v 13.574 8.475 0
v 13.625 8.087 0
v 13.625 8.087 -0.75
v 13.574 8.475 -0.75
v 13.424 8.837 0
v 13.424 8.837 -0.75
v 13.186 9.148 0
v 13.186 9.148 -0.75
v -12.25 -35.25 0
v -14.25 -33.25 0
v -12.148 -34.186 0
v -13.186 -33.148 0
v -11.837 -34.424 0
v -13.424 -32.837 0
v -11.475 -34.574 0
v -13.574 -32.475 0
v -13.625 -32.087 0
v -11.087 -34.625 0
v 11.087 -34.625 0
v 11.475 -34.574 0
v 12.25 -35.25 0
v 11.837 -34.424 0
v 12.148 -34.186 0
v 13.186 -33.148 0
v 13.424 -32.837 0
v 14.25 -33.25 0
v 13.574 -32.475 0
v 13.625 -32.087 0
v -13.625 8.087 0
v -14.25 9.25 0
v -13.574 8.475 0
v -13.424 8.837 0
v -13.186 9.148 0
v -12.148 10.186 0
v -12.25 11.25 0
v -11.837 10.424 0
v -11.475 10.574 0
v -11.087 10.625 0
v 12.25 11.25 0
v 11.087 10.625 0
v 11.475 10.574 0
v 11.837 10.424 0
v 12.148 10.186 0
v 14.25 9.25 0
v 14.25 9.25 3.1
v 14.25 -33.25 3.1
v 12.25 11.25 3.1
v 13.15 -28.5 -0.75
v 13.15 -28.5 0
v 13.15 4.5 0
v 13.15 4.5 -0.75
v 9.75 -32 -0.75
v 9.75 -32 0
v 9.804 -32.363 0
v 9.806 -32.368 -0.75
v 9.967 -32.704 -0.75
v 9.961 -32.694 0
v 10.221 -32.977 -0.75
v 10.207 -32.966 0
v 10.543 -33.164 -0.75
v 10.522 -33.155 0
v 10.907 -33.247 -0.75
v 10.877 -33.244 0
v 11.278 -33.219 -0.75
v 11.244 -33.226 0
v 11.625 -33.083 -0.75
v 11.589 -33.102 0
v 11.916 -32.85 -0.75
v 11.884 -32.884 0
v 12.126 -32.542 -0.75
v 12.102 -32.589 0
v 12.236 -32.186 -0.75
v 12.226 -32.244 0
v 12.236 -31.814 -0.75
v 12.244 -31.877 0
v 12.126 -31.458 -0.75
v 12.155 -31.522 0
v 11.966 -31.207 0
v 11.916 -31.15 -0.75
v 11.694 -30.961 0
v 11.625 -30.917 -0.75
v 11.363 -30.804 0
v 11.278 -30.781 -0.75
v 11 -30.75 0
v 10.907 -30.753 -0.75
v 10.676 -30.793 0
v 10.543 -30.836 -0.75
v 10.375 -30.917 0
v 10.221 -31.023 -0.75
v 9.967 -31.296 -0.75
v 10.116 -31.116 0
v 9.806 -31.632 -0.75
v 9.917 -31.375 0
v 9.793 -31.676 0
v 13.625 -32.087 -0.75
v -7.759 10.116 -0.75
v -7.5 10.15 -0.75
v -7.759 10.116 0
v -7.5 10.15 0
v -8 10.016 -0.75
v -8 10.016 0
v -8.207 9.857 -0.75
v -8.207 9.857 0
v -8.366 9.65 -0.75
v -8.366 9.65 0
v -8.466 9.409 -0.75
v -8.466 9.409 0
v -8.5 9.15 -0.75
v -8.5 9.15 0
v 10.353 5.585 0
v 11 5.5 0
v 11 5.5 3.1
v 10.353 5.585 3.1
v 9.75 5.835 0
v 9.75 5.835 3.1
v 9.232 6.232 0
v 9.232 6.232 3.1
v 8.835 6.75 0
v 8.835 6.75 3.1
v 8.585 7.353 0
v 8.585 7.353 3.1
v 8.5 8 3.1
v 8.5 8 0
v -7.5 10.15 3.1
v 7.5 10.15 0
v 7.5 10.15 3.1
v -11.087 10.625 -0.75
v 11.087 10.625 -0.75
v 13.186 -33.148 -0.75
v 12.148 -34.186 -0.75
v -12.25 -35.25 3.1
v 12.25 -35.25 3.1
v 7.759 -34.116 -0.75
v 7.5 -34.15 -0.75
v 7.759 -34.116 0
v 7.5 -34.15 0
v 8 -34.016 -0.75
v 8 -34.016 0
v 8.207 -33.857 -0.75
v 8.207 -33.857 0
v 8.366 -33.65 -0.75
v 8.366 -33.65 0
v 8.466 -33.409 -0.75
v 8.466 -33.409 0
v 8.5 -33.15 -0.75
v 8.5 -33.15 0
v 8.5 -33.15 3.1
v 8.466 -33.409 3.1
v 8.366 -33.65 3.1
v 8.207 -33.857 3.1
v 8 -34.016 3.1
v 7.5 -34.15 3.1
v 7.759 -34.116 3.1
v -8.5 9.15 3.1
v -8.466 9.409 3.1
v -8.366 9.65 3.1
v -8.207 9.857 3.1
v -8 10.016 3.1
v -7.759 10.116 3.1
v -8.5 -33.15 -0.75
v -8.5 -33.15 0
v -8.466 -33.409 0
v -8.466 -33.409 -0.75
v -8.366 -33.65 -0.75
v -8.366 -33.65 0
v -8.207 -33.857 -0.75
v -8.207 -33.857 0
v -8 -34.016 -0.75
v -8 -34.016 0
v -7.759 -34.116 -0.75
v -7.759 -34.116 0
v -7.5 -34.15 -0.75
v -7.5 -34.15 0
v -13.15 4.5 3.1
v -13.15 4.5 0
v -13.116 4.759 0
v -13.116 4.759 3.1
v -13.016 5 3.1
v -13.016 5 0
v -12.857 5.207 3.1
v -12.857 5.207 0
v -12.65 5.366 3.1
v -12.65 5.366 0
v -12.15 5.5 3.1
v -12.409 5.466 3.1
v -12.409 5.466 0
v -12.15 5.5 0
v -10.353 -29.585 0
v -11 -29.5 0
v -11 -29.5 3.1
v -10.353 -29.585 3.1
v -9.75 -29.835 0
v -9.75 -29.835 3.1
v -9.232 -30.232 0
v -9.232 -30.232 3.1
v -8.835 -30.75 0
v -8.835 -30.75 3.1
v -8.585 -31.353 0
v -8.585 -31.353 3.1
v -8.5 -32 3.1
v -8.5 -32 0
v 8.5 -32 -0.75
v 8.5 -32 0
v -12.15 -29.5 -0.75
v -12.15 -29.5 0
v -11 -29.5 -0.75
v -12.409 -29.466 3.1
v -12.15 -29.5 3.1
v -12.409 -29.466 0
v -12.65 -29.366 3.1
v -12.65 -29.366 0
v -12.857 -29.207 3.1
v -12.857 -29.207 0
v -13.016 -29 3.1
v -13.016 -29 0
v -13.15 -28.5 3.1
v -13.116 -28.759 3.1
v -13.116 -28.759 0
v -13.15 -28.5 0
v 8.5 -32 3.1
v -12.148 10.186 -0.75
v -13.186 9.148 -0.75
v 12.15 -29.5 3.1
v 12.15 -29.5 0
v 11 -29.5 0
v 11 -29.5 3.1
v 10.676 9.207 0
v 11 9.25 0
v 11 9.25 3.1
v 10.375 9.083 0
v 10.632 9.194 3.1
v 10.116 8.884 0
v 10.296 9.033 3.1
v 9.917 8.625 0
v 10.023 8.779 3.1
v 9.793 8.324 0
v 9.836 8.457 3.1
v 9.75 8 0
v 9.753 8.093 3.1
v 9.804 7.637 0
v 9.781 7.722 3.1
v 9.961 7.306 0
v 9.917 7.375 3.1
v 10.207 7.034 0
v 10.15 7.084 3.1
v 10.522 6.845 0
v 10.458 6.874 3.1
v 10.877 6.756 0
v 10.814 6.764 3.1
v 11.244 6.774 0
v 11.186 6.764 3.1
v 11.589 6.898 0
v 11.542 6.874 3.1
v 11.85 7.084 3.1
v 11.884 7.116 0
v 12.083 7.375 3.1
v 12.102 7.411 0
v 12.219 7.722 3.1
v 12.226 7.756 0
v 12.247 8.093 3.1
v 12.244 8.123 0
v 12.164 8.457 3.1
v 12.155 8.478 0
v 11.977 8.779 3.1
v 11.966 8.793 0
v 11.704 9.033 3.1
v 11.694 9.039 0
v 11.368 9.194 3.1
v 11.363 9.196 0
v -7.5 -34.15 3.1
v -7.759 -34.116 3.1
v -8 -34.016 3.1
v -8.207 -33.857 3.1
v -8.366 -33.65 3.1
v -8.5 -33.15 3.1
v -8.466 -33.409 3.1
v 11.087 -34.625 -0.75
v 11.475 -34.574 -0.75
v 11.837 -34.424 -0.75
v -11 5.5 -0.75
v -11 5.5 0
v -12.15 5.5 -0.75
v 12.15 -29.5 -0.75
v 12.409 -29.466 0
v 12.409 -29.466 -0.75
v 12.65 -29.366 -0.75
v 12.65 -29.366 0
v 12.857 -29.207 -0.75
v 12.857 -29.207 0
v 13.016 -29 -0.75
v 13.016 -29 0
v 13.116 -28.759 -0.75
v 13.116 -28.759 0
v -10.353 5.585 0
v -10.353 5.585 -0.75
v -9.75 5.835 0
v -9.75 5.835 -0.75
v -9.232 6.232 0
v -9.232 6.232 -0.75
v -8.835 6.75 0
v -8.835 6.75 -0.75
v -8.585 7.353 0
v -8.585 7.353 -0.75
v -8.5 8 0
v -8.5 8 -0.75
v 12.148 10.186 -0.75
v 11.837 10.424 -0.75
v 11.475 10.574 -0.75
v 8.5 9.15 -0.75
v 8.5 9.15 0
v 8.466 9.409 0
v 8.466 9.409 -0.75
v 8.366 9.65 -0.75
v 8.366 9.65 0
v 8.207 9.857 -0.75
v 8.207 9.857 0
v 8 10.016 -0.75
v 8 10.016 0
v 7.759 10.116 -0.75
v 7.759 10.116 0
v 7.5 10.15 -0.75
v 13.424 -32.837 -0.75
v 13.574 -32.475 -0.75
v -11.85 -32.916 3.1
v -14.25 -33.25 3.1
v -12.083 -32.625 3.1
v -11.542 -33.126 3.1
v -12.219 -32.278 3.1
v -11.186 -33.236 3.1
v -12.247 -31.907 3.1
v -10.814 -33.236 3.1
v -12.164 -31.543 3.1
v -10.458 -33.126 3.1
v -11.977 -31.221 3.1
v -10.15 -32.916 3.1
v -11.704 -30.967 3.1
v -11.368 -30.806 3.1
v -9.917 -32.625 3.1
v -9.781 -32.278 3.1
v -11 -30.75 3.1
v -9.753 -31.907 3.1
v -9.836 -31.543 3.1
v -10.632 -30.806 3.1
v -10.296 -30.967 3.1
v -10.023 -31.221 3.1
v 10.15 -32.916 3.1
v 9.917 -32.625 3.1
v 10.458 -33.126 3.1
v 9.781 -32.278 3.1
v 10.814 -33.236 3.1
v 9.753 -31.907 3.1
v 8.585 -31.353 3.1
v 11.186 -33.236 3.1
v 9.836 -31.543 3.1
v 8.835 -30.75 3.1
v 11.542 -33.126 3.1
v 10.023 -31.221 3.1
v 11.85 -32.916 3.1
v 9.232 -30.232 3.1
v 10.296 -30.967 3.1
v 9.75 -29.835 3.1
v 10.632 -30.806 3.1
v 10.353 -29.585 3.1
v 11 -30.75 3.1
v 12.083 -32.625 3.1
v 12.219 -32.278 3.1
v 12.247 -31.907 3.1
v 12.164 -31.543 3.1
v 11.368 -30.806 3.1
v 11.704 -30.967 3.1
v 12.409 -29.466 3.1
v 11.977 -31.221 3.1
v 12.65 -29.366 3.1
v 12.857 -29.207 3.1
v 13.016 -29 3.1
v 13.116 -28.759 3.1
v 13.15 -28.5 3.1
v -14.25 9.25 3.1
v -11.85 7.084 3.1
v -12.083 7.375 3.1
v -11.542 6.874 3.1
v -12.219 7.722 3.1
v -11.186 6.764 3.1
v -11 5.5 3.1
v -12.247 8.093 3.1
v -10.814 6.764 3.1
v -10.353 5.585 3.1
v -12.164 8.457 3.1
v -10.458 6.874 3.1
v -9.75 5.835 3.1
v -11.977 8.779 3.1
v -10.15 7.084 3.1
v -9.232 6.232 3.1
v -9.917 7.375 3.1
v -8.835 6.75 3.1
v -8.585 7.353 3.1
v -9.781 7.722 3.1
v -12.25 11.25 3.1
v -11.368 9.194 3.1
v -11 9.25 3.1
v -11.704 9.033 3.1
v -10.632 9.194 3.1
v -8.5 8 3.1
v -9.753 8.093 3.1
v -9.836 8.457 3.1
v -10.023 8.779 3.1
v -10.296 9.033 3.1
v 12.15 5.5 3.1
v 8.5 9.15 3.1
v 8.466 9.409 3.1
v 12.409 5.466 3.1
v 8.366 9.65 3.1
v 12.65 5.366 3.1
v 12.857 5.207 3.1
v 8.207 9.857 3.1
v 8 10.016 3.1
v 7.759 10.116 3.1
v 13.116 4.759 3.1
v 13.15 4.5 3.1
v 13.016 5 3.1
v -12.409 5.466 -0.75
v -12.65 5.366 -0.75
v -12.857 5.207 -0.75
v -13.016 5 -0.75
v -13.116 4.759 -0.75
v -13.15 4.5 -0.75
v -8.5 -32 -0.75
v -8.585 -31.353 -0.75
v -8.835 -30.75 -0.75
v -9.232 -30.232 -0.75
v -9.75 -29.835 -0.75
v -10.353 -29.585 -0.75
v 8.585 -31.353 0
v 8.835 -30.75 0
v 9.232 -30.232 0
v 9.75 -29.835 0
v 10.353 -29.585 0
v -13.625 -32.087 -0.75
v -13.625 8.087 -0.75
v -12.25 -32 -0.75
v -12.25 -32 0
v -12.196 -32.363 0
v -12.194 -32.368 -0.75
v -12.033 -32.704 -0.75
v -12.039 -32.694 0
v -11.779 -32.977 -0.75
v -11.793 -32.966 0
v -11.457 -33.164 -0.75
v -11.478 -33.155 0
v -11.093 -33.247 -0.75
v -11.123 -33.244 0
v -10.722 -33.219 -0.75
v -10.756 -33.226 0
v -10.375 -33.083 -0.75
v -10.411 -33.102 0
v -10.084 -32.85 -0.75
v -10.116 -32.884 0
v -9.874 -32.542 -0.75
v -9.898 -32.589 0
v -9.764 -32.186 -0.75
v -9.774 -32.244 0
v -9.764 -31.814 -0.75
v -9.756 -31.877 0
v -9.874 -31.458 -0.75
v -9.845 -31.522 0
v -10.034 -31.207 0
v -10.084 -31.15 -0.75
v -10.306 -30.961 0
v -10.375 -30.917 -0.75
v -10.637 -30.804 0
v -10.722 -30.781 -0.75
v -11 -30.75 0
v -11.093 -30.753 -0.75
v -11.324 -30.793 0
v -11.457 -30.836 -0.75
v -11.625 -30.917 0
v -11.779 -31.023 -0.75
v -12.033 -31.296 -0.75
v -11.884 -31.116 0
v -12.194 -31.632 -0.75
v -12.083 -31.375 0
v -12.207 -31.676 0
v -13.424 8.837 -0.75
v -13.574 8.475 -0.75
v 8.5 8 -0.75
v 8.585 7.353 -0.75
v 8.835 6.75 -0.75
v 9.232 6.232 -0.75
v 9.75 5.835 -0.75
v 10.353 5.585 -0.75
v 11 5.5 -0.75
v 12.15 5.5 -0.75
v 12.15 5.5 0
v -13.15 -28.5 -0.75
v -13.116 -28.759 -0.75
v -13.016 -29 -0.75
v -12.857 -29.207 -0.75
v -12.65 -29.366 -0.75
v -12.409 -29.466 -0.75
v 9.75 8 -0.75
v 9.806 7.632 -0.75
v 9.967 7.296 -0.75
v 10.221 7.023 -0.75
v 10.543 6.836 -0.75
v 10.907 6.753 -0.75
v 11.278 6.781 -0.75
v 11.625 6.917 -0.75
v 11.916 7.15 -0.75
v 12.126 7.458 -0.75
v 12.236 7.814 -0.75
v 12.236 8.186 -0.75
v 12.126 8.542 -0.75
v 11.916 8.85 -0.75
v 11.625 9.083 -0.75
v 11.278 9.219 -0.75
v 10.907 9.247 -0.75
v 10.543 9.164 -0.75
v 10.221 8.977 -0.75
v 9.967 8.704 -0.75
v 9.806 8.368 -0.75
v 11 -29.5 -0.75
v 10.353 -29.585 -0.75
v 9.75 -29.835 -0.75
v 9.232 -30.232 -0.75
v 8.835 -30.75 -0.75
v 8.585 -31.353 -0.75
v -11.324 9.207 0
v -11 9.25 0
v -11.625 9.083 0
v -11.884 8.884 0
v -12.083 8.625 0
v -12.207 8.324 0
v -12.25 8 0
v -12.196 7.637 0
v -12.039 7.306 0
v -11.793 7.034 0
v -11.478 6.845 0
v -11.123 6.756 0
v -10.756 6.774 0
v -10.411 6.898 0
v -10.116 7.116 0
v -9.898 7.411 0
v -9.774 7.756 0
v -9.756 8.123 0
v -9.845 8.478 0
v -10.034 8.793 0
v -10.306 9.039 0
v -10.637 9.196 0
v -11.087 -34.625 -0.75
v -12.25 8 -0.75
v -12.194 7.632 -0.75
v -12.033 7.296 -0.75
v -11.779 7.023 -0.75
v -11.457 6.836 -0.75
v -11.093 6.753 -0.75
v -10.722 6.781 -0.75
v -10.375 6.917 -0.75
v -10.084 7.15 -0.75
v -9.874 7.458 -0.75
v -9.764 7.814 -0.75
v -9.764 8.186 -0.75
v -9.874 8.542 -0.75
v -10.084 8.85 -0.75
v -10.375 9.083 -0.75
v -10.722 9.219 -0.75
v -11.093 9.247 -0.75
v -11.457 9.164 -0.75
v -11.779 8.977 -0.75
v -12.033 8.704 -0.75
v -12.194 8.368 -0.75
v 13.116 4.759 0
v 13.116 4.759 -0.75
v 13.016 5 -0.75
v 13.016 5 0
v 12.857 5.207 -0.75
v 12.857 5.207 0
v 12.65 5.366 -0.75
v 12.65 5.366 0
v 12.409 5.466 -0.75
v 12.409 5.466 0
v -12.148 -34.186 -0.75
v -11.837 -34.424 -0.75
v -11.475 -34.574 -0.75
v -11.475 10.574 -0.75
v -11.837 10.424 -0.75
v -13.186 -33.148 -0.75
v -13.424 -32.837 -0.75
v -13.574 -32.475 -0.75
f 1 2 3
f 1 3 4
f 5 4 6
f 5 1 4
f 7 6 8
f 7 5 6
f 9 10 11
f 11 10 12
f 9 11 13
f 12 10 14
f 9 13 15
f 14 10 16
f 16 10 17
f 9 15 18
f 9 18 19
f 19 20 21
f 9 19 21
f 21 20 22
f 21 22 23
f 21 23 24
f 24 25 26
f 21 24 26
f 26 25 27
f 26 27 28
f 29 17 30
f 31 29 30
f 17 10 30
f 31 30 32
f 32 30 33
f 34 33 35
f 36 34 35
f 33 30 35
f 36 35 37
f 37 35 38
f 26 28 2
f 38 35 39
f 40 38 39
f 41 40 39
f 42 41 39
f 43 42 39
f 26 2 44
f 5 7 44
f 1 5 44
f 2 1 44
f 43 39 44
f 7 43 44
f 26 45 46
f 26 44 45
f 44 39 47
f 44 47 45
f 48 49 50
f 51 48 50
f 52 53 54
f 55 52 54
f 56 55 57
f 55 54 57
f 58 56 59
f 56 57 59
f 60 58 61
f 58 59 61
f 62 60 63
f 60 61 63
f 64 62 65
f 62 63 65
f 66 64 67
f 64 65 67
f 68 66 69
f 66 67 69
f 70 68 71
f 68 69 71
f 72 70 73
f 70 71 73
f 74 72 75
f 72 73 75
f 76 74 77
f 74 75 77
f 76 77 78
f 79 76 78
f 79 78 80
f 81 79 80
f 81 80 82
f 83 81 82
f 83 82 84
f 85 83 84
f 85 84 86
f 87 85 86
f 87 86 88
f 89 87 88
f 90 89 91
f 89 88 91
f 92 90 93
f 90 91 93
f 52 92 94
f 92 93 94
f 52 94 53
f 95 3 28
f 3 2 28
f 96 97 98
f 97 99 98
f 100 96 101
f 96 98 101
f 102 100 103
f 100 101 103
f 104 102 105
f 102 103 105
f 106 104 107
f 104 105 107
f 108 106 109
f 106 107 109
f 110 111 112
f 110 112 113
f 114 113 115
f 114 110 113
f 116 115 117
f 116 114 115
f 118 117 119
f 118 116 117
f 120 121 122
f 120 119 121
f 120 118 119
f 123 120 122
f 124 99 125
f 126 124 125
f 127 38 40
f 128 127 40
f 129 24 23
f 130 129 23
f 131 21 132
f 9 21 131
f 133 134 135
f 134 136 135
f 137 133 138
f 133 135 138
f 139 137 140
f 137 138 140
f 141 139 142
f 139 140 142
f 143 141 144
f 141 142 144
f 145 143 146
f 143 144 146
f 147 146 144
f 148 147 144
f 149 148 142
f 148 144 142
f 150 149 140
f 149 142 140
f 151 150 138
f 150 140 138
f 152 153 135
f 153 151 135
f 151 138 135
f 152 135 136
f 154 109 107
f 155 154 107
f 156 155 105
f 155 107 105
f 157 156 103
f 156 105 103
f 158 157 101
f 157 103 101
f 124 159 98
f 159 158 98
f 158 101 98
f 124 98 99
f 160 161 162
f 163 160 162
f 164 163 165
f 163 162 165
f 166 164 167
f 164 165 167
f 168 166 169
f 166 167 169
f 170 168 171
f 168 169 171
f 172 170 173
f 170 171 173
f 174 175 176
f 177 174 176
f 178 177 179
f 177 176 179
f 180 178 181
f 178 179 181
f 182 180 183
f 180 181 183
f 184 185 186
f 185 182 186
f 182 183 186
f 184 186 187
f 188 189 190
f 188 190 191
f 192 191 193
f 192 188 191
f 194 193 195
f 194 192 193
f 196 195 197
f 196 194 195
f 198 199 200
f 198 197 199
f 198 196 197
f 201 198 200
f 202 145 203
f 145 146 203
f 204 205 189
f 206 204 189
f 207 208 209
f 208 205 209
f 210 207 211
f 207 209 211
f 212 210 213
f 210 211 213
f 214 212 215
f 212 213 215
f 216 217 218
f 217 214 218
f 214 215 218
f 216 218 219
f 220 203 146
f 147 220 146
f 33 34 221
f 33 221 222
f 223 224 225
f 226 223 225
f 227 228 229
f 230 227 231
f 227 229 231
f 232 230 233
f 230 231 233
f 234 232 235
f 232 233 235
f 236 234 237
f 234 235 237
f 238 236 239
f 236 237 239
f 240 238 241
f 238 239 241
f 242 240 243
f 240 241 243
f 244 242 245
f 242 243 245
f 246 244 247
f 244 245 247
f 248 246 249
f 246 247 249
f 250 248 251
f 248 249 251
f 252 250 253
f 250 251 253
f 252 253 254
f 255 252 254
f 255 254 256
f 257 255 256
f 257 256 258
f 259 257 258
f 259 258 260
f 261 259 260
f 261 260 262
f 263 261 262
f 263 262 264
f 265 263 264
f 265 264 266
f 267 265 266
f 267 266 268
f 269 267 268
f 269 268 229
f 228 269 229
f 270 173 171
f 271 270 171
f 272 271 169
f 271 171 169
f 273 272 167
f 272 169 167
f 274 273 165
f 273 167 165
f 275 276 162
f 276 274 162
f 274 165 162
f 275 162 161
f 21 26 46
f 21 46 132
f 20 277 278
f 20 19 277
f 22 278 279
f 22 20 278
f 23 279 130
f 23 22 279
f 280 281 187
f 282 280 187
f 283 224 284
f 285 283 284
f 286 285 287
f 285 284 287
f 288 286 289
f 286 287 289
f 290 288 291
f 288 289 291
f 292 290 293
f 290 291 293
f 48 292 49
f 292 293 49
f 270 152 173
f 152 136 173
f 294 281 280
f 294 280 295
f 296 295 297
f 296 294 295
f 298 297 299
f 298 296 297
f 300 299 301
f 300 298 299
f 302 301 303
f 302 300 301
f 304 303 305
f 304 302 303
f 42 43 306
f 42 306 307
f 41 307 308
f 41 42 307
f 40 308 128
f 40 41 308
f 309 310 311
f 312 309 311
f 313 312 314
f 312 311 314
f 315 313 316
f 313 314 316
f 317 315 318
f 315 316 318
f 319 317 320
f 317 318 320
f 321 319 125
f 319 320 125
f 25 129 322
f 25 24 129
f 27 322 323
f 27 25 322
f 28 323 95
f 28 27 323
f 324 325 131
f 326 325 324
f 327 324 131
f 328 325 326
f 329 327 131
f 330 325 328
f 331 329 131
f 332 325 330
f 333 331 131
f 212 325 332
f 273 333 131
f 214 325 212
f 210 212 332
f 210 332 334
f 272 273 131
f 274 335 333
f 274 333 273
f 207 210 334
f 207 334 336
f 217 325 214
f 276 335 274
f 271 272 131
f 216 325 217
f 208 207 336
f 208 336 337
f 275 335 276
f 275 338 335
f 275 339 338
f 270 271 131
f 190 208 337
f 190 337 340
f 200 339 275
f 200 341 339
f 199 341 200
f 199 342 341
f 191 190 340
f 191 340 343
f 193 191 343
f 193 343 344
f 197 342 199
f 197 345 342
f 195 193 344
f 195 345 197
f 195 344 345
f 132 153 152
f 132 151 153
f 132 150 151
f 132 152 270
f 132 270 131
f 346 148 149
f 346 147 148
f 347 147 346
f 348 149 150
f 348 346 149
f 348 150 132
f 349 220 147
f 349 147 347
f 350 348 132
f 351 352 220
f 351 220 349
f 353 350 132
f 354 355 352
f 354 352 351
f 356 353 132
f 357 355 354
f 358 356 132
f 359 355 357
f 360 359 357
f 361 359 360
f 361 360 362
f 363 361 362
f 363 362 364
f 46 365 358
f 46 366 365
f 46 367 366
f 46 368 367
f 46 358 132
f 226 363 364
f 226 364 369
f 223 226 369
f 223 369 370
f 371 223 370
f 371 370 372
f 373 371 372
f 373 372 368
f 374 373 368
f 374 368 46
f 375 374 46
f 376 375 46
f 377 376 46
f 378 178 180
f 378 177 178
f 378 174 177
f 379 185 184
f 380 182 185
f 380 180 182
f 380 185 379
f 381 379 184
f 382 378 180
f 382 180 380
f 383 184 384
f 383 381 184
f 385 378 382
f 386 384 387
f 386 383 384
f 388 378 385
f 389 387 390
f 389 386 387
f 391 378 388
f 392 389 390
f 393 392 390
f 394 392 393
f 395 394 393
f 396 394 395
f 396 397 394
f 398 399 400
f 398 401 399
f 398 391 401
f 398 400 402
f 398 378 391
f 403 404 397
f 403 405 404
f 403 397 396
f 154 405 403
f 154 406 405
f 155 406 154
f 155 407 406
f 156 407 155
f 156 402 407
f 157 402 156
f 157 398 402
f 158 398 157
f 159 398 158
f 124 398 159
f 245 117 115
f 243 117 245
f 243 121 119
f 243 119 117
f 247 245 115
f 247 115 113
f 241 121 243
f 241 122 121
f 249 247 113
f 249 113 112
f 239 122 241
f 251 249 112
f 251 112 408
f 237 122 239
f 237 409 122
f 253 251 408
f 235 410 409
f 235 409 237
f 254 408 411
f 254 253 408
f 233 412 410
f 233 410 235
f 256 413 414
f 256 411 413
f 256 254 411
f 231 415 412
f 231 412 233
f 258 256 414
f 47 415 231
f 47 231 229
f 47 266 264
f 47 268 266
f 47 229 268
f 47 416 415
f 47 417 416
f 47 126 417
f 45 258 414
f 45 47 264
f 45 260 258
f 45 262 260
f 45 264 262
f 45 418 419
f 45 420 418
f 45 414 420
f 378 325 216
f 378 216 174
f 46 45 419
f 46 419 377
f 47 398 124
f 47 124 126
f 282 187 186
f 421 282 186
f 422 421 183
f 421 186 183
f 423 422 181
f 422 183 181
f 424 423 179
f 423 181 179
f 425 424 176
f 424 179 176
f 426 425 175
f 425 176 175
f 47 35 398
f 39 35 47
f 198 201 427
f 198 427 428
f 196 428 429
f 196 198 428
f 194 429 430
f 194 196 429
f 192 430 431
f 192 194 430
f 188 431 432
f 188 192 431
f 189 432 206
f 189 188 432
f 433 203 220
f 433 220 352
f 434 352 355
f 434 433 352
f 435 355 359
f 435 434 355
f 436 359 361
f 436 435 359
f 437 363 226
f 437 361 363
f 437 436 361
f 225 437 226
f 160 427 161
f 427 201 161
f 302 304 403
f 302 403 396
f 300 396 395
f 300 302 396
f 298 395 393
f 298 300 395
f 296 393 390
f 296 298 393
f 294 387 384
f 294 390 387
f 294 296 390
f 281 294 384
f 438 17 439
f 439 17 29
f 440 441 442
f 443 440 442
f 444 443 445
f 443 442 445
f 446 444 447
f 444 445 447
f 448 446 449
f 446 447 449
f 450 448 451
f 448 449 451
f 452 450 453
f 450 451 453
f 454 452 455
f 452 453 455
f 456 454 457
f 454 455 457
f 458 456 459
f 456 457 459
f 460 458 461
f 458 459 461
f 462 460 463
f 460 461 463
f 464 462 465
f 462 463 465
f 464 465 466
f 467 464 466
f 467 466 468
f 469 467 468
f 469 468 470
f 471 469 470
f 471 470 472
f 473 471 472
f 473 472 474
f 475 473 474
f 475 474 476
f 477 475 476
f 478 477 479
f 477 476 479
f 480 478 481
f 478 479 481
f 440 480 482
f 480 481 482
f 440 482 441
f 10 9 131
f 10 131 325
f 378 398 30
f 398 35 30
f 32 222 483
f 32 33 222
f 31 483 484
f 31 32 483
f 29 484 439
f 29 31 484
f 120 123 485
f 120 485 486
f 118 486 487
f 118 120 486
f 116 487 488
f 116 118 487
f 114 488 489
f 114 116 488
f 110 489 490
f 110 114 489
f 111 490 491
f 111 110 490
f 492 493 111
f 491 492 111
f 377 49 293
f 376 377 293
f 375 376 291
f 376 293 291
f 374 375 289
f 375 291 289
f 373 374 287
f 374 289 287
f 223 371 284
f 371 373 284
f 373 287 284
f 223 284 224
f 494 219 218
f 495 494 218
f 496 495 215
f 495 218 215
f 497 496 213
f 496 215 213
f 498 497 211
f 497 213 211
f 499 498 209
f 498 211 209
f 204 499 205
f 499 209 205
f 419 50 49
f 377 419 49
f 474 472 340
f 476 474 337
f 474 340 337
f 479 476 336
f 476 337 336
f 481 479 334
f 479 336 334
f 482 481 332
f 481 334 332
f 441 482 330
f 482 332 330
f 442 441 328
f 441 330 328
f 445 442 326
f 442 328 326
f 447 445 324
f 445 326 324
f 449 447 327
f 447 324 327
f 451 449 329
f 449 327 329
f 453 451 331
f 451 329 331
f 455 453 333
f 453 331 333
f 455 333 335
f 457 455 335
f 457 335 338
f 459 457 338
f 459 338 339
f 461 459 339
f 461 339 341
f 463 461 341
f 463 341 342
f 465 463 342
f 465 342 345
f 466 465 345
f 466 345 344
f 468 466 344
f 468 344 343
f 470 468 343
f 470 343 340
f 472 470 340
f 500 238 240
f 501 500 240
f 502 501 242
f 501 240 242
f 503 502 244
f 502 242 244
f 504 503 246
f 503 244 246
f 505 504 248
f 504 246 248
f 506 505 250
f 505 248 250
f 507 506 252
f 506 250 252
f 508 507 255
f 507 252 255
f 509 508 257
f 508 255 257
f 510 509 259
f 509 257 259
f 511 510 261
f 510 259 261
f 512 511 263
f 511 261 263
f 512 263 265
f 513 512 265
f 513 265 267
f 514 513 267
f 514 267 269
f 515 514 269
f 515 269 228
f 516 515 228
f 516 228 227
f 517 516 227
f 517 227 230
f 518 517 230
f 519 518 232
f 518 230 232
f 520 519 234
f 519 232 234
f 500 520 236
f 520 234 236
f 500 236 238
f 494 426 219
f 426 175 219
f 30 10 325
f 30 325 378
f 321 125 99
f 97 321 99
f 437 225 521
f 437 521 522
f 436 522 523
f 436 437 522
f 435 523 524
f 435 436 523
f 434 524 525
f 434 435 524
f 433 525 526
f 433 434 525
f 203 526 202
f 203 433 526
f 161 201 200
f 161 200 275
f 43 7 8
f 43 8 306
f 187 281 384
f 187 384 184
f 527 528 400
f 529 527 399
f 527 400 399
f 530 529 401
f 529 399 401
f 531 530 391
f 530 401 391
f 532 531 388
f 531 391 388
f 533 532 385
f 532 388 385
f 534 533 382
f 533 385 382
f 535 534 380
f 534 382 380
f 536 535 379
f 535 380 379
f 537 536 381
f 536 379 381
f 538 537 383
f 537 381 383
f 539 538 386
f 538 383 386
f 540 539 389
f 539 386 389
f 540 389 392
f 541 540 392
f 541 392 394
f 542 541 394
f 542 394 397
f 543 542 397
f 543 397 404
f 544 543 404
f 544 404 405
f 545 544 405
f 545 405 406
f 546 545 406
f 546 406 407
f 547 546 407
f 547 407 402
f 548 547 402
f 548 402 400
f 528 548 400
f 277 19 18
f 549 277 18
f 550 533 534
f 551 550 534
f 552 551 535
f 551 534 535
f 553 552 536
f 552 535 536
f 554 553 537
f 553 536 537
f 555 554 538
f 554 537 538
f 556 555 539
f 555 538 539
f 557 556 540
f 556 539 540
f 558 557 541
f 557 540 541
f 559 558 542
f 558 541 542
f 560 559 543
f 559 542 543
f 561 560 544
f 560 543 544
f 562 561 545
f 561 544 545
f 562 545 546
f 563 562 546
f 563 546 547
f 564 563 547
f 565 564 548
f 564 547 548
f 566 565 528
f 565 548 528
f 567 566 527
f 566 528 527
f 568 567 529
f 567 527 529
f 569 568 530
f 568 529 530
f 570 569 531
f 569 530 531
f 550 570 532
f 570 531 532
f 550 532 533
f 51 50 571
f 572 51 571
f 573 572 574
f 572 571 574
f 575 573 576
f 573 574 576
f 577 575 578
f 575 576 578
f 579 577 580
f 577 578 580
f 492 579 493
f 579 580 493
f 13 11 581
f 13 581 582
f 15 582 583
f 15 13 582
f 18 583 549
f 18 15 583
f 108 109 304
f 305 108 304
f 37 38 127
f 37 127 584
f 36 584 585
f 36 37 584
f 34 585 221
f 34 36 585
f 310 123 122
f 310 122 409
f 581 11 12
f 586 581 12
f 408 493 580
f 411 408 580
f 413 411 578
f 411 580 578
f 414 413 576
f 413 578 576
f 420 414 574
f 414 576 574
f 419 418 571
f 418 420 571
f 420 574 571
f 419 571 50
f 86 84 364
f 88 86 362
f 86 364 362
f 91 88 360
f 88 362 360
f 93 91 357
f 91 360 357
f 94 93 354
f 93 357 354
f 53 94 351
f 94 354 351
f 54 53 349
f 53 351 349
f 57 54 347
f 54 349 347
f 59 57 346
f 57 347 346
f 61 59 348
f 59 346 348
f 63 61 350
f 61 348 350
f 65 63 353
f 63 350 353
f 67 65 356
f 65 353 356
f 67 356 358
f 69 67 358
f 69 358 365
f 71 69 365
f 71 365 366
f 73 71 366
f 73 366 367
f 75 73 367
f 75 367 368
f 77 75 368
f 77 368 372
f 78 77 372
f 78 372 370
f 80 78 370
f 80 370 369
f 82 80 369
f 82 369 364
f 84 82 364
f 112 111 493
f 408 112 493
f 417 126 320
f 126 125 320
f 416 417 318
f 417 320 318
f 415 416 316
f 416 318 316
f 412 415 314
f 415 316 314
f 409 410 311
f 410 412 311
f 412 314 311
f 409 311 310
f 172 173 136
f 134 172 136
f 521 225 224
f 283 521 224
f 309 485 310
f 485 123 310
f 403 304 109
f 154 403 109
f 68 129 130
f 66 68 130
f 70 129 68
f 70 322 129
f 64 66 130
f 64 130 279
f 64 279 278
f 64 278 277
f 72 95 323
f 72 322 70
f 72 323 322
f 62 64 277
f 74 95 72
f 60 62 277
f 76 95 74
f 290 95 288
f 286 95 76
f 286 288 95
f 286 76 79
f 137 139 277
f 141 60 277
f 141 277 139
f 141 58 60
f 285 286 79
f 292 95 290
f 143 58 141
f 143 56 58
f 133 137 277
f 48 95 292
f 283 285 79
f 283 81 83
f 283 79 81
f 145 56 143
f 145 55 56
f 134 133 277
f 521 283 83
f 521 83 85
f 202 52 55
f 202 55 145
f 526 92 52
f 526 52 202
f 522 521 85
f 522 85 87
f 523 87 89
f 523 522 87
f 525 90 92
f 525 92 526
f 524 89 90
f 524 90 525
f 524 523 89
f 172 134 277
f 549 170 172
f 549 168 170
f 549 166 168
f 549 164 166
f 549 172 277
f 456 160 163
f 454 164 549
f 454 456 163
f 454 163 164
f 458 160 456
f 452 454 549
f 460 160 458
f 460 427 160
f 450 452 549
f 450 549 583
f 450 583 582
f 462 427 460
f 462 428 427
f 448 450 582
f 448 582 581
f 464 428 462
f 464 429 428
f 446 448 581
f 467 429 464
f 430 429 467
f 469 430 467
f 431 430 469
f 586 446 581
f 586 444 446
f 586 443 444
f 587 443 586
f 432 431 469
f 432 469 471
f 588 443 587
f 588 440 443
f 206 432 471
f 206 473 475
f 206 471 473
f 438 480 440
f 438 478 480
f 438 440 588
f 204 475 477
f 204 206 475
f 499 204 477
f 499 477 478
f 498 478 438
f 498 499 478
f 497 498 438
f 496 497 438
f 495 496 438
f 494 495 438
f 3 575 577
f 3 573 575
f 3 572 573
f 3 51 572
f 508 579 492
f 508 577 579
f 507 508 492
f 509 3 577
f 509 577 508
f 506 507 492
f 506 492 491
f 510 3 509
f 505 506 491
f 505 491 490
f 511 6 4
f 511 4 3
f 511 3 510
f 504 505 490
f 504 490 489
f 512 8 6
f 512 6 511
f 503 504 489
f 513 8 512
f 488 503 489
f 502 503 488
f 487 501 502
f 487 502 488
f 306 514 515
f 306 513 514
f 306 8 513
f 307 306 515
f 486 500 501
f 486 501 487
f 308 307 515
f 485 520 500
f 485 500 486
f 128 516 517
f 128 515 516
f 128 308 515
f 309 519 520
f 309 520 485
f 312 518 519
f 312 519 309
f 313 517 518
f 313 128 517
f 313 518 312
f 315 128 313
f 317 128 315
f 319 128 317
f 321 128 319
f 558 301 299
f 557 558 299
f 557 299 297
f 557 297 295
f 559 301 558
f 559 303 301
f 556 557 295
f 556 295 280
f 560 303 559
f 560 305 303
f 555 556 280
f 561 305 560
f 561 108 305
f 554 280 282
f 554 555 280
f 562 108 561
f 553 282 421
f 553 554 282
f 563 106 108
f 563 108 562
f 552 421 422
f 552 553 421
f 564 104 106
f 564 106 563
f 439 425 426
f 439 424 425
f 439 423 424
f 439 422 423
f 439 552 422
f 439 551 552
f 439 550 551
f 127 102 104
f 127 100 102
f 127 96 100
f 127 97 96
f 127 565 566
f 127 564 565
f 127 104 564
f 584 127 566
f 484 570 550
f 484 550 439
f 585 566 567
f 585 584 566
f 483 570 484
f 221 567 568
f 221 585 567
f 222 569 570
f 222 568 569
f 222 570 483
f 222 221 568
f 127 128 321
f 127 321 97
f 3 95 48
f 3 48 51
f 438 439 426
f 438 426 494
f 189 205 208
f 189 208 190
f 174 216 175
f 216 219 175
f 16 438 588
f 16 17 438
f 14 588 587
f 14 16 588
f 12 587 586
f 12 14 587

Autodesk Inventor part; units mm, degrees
ref_plane "YZ Plane" through (0, 0, 0) normal (1, 0, 0) x (0, 1, 0)
ref_plane "XZ Plane" through (0, 0, 0) normal (0, 1, 0) x (-1, 0, 0)
ref_plane "XY Plane" through (0, 0, 0) normal (0, 0, 1) x (1, 0, 0)
sketch "スケッチ1" plane through (0, 0, 0) normal (0, 0, 1) x (1, 0, 0)
  line L0 (-12.25, 11.25) -> (12.25, 11.25)
  line L1 (14.25, 9.25) -> (14.25, -33.25)
  line L2 (12.25, -35.25) -> (-12.25, -35.25)
  line L3 (-14.25, -33.25) -> (-14.25, 9.25)
  line L4 (-12.25, 11.25) -> (-14.25, 9.25)
  line L5 (12.25, 11.25) -> (14.25, 9.25)
  line L6 (14.25, -33.25) -> (12.25, -35.25)
  line L7 (-12.25, -35.25) -> (-14.25, -33.25)
  line L8 (0, 0) -> (-26.5626, 0) construction
  line L9 (0, 0) -> (0, 27.9433) construction
  line L10 (-11, 8) -> (11, 8) construction
  line L11 (11, 8) -> (11, -32) construction
  line L12 (11, -32) -> (-11, -32) construction
  line L13 (-11, -32) -> (-11, 8) construction
  line L14 (-13.15, -28.5) -> (-13.15, 4.5)
  line L15 (-7.5, 10.15) -> (7.5, 10.15)
  line L16 (13.15, 4.5) -> (13.15, -28.5)
  line L17 (7.5, -34.15) -> (-7.5, -34.15)
  line L18 (8.5, 8) -> (8.5, 9.15)
  line L19 (11, 5.5) -> (12.15, 5.5)
  arc A0 (8.5, 8) -> (11, 5.5) centre (11, 8) ccw
  line L20 (12.15, -29.5) -> (11, -29.5)
  line L21 (8.5, -32) -> (8.5, -33.15)
  arc A1 (11, -29.5) -> (8.5, -32) centre (11, -32) ccw
  line L22 (-8.5, 8) -> (-8.5, 9.15)
  line L23 (-11, 5.5) -> (-12.15, 5.5)
  arc A2 (-11, 5.5) -> (-8.5, 8) centre (-11, 8) ccw
  line L24 (-12.15, -29.5) -> (-11, -29.5)
  line L25 (-8.5, -32) -> (-8.5, -33.15)
  arc A3 (-8.5, -32) -> (-11, -29.5) centre (-11, -32) ccw
  arc A4 (8.5, 9.15) -> (7.5, 10.15) centre (7.5, 9.15) ccw
  arc A5 (13.15, 4.5) -> (12.15, 5.5) centre (12.15, 4.5) ccw
  arc A6 (12.15, -29.5) -> (13.15, -28.5) centre (12.15, -28.5) ccw
  arc A7 (7.5, -34.15) -> (8.5, -33.15) centre (7.5, -33.15) ccw
  arc A8 (-8.5, -33.15) -> (-7.5, -34.15) centre (-7.5, -33.15) ccw
  arc A9 (-13.15, -28.5) -> (-12.15, -29.5) centre (-12.15, -28.5) ccw
  arc A10 (-12.15, 5.5) -> (-13.15, 4.5) centre (-12.15, 4.5) ccw
  arc A11 (-7.5, 10.15) -> (-8.5, 9.15) centre (-7.5, 9.15) ccw
  point P0 (-14.25, 11.25)
  point P1 (14.25, -35.25)
  point P2 (14.25, 11.25)
  point P3 (-14.25, -35.25)
  point P4 (8.5, 10.15)
  point P5 (13.15, 5.5)
  point P6 (13.15, -29.5)
  point P7 (8.5, -34.15)
  point P8 (-8.5, 10.15)
  point P9 (-13.15, 5.5)
  point P10 (-13.15, -29.5)
  point P11 (-8.5, -34.15)
  dimension "d0" = 2
  dimension "d1" = 2
  dimension "d2" = 2
  dimension "d3" = 2
  dimension "d4" = 2
  dimension "d5" = 2
  dimension "d6" = 2
  dimension "d7" = 2
  dimension "d8" = 28.5
  dimension "d9" = 11.25
  dimension "d10" = 46.5
  dimension "d11" = 8
  dimension "d12" = 22
  dimension "d13" = 40
  dimension "d14" = 1.1
  dimension "d15" = 2.5
  dimension "d16" = 2.5
  dimension "d17" = 1.1
  dimension "d18" = 1.1
  dimension "d19" = 1
extrude "押し出し1" add sketch "スケッチ1" along normal blind 3.1
hole "穴1" at (-11, 8, 0) at (11, 8, 0) at (11, -32, 0) at (-11, -32, 0) direction (0, 0, 1) diameter 2.5 end through all
sketch "スケッチ3" plane through (0, 0, 0) normal (0, 0, -1) x (-1, 0, 0)
  line L0 (-12.25, 11.25) -> (12.25, 11.25) construction
  line L1 (12.25, 11.25) -> (14.25, 9.25) construction
  line L2 (14.25, 9.25) -> (14.25, -33.25) construction
  line L3 (14.25, -33.25) -> (12.25, -35.25) construction
  line L4 (12.25, -35.25) -> (-12.25, -35.25) construction
  line L5 (-12.25, -35.25) -> (-14.25, -33.25) construction
  line L6 (-14.25, -33.25) -> (-14.25, 9.25) construction
  line L7 (-14.25, 9.25) -> (-12.25, 11.25) construction
  line L8 (11.087, 10.625) -> (-11.087, 10.625)
  line L9 (-11.9911, 10.625) -> (-13.625, 8.9911) construction
  line L10 (-13.625, 8.087) -> (-13.625, -32.087)
  line L11 (-13.625, -32.9911) -> (-11.9911, -34.625) construction
  line L12 (-11.087, -34.625) -> (11.087, -34.625)
  line L13 (11.9911, -34.625) -> (13.625, -32.9911) construction
  line L14 (13.625, -32.087) -> (13.625, 8.087)
  line L15 (13.625, 8.9911) -> (11.9911, 10.625) construction
  line L16 (-13.1857, -33.1476) -> (-12.1476, -34.1857)
  line L17 (12.1476, -34.1857) -> (13.1857, -33.1476)
  line L18 (12.1476, 10.1857) -> (13.1857, 9.1476)
  line L19 (-13.1857, 9.1476) -> (-12.1476, 10.1857)
  arc A0 (-13.1857, 9.1476) -> (-13.625, 8.087) centre (-12.125, 8.087) ccw
  arc A1 (-11.087, 10.625) -> (-12.1476, 10.1857) centre (-11.087, 9.125) ccw
  arc A2 (12.1476, 10.1857) -> (11.087, 10.625) centre (11.087, 9.125) ccw
  arc A3 (13.625, 8.087) -> (13.1857, 9.1476) centre (12.125, 8.087) ccw
  arc A4 (13.1857, -33.1476) -> (13.625, -32.087) centre (12.125, -32.087) ccw
  arc A5 (11.087, -34.625) -> (12.1476, -34.1857) centre (11.087, -33.125) ccw
  arc A6 (-12.1476, -34.1857) -> (-11.087, -34.625) centre (-11.087, -33.125) ccw
  arc A7 (-13.625, -32.087) -> (-13.1857, -33.1476) centre (-12.125, -32.087) ccw
  arc A8 (-12.15, 5.5) -> (-13.15, 4.5) centre (-12.15, 4.5) ccw projected
  line L20 (-12.15, 5.5) -> (-11, 5.5) projected
  arc A9 (-11, 5.5) -> (-8.5, 8) centre (-11, 8) ccw projected
  line L21 (-8.5, 8) -> (-8.5, 9.15) projected
  arc A10 (-7.5, 10.15) -> (-8.5, 9.15) centre (-7.5, 9.15) ccw projected
  line L22 (-7.5, 10.15) -> (7.5, 10.15) projected
  arc A11 (8.5, 9.15) -> (7.5, 10.15) centre (7.5, 9.15) ccw projected
  line L23 (8.5, 9.15) -> (8.5, 8) projected
  arc A12 (8.5, 8) -> (11, 5.5) centre (11, 8) ccw projected
  line L24 (11, 5.5) -> (12.15, 5.5) projected
  arc A13 (13.15, 4.5) -> (12.15, 5.5) centre (12.15, 4.5) ccw projected
  circle A14 centre (11, 8) radius 1.25 projected
  line L25 (13.15, 4.5) -> (13.15, -28.5) projected
  arc A15 (12.15, -29.5) -> (13.15, -28.5) centre (12.15, -28.5) ccw projected
  line L26 (12.15, -29.5) -> (11, -29.5) projected
  arc A16 (11, -29.5) -> (8.5, -32) centre (11, -32) ccw projected
  line L27 (8.5, -32) -> (8.5, -33.15) projected
  arc A17 (7.5, -34.15) -> (8.5, -33.15) centre (7.5, -33.15) ccw projected
  circle A18 centre (11, -32) radius 1.25 projected
  line L28 (7.5, -34.15) -> (-7.5, -34.15) projected
  arc A19 (-8.5, -33.15) -> (-7.5, -34.15) centre (-7.5, -33.15) ccw projected
  line L29 (-8.5, -33.15) -> (-8.5, -32) projected
  arc A20 (-8.5, -32) -> (-11, -29.5) centre (-11, -32) ccw projected
  line L30 (-11, -29.5) -> (-12.15, -29.5) projected
  arc A21 (-13.15, -28.5) -> (-12.15, -29.5) centre (-12.15, -28.5) ccw projected
  circle A22 centre (-11, -32) radius 1.25 projected
  line L31 (-13.15, -28.5) -> (-13.15, 4.5) projected
  circle A23 centre (-11, 8) radius 1.25 projected
  point P0 (0, 0)
  dimension "d30" = 0.625
  dimension "d31" = 1.5
  dimension "d32" = 0.2
extrude "押し出し2" add sketch "スケッチ3" along normal blind 0.75
equation "\"d1\" = d0"
equation "\"d2\" = d0"
equation "\"d3\" = d2"
equation "\"d4\" = d0"
equation "\"d5\" = d4"
equation "\"d6\" = d0"
equation "\"d7\" = d6"
properties part number "COXA_YAW_ROLL_ADPT_SPACER_2"
